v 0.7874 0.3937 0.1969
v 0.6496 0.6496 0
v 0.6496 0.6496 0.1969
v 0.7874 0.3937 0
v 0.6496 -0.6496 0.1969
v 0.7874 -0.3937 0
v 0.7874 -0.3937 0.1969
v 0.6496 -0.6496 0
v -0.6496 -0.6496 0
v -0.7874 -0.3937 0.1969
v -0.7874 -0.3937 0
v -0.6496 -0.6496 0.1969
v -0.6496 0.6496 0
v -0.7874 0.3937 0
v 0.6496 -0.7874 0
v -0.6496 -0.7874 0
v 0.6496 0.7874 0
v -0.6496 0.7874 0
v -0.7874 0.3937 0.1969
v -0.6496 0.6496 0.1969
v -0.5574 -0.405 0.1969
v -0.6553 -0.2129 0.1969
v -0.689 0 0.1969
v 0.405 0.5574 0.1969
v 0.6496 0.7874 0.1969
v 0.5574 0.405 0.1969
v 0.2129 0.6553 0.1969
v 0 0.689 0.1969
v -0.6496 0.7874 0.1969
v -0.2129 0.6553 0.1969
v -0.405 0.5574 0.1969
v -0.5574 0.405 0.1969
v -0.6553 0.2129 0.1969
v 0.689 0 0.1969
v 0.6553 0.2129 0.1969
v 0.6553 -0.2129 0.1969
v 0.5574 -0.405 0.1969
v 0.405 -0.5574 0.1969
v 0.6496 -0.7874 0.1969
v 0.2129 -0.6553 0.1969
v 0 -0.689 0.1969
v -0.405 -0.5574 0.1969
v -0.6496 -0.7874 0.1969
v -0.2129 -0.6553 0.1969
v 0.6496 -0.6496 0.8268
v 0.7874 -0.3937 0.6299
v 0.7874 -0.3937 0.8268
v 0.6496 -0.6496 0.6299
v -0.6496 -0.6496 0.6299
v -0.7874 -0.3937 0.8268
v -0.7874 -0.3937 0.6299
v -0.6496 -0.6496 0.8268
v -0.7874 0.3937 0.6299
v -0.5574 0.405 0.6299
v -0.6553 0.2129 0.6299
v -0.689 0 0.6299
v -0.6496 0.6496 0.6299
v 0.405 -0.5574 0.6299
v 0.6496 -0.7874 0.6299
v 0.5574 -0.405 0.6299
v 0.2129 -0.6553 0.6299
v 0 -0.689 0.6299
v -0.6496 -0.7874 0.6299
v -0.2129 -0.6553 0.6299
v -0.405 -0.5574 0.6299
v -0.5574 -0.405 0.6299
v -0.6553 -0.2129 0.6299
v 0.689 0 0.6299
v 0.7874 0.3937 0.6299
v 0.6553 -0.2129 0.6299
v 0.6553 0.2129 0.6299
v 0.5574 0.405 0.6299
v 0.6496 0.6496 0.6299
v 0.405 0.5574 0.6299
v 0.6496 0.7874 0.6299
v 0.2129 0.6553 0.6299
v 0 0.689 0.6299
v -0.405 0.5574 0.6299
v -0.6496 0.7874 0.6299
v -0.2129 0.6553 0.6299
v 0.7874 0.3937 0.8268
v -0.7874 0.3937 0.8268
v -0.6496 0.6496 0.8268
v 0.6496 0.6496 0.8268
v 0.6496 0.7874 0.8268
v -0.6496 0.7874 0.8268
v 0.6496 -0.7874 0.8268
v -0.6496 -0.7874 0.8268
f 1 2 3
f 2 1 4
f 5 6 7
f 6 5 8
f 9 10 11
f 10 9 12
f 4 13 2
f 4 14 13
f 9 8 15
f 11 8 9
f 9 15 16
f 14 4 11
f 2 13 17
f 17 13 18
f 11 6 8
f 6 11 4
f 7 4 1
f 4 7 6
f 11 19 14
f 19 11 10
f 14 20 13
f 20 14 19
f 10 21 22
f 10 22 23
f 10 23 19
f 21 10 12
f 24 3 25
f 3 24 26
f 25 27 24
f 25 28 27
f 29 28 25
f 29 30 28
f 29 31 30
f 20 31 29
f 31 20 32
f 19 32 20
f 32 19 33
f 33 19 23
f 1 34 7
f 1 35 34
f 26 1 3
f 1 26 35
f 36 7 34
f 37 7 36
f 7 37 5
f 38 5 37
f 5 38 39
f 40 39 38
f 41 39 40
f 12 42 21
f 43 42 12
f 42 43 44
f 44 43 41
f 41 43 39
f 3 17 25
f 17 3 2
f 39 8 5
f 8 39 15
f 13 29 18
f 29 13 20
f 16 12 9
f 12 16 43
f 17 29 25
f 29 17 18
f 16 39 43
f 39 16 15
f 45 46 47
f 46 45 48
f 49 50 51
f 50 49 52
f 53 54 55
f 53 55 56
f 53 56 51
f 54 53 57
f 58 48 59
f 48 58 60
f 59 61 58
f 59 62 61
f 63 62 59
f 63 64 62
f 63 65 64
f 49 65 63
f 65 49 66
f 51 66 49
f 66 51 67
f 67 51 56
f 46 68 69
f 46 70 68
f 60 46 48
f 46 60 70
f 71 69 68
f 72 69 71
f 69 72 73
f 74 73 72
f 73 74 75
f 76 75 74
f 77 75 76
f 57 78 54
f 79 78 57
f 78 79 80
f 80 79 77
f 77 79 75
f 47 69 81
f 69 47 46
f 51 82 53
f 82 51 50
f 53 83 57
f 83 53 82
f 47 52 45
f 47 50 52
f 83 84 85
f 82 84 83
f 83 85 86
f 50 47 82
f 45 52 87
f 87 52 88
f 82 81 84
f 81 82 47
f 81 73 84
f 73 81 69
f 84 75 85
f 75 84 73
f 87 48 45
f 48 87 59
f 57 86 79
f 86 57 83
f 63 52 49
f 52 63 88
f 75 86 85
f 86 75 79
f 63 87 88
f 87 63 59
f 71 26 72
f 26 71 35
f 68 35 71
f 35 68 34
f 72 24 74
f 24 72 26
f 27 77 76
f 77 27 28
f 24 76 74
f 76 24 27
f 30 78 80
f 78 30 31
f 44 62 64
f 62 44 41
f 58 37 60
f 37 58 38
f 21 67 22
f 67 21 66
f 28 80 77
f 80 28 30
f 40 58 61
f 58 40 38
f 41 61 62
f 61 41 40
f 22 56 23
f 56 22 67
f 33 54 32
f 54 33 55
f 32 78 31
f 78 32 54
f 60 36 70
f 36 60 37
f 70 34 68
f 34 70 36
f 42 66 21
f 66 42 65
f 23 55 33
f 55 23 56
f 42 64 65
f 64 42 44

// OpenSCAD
// TYA4020
scale(10/25.4)
{
    color("gold")translate([0,0,0.05])cylinder(d=3.5,h=2,$fn=20);
    color("black")for(z=[0,2.1-0.5])
    {   
        hull()
        {
            translate([-2,-1,z])cube([4,2,0.5]);
            translate([-1.65,-1.65,z])cube([3.3,3.3,0.5]);
        }
        translate([-1.65,-2,z])cube([3.3,4,0.5]);
    }
}
